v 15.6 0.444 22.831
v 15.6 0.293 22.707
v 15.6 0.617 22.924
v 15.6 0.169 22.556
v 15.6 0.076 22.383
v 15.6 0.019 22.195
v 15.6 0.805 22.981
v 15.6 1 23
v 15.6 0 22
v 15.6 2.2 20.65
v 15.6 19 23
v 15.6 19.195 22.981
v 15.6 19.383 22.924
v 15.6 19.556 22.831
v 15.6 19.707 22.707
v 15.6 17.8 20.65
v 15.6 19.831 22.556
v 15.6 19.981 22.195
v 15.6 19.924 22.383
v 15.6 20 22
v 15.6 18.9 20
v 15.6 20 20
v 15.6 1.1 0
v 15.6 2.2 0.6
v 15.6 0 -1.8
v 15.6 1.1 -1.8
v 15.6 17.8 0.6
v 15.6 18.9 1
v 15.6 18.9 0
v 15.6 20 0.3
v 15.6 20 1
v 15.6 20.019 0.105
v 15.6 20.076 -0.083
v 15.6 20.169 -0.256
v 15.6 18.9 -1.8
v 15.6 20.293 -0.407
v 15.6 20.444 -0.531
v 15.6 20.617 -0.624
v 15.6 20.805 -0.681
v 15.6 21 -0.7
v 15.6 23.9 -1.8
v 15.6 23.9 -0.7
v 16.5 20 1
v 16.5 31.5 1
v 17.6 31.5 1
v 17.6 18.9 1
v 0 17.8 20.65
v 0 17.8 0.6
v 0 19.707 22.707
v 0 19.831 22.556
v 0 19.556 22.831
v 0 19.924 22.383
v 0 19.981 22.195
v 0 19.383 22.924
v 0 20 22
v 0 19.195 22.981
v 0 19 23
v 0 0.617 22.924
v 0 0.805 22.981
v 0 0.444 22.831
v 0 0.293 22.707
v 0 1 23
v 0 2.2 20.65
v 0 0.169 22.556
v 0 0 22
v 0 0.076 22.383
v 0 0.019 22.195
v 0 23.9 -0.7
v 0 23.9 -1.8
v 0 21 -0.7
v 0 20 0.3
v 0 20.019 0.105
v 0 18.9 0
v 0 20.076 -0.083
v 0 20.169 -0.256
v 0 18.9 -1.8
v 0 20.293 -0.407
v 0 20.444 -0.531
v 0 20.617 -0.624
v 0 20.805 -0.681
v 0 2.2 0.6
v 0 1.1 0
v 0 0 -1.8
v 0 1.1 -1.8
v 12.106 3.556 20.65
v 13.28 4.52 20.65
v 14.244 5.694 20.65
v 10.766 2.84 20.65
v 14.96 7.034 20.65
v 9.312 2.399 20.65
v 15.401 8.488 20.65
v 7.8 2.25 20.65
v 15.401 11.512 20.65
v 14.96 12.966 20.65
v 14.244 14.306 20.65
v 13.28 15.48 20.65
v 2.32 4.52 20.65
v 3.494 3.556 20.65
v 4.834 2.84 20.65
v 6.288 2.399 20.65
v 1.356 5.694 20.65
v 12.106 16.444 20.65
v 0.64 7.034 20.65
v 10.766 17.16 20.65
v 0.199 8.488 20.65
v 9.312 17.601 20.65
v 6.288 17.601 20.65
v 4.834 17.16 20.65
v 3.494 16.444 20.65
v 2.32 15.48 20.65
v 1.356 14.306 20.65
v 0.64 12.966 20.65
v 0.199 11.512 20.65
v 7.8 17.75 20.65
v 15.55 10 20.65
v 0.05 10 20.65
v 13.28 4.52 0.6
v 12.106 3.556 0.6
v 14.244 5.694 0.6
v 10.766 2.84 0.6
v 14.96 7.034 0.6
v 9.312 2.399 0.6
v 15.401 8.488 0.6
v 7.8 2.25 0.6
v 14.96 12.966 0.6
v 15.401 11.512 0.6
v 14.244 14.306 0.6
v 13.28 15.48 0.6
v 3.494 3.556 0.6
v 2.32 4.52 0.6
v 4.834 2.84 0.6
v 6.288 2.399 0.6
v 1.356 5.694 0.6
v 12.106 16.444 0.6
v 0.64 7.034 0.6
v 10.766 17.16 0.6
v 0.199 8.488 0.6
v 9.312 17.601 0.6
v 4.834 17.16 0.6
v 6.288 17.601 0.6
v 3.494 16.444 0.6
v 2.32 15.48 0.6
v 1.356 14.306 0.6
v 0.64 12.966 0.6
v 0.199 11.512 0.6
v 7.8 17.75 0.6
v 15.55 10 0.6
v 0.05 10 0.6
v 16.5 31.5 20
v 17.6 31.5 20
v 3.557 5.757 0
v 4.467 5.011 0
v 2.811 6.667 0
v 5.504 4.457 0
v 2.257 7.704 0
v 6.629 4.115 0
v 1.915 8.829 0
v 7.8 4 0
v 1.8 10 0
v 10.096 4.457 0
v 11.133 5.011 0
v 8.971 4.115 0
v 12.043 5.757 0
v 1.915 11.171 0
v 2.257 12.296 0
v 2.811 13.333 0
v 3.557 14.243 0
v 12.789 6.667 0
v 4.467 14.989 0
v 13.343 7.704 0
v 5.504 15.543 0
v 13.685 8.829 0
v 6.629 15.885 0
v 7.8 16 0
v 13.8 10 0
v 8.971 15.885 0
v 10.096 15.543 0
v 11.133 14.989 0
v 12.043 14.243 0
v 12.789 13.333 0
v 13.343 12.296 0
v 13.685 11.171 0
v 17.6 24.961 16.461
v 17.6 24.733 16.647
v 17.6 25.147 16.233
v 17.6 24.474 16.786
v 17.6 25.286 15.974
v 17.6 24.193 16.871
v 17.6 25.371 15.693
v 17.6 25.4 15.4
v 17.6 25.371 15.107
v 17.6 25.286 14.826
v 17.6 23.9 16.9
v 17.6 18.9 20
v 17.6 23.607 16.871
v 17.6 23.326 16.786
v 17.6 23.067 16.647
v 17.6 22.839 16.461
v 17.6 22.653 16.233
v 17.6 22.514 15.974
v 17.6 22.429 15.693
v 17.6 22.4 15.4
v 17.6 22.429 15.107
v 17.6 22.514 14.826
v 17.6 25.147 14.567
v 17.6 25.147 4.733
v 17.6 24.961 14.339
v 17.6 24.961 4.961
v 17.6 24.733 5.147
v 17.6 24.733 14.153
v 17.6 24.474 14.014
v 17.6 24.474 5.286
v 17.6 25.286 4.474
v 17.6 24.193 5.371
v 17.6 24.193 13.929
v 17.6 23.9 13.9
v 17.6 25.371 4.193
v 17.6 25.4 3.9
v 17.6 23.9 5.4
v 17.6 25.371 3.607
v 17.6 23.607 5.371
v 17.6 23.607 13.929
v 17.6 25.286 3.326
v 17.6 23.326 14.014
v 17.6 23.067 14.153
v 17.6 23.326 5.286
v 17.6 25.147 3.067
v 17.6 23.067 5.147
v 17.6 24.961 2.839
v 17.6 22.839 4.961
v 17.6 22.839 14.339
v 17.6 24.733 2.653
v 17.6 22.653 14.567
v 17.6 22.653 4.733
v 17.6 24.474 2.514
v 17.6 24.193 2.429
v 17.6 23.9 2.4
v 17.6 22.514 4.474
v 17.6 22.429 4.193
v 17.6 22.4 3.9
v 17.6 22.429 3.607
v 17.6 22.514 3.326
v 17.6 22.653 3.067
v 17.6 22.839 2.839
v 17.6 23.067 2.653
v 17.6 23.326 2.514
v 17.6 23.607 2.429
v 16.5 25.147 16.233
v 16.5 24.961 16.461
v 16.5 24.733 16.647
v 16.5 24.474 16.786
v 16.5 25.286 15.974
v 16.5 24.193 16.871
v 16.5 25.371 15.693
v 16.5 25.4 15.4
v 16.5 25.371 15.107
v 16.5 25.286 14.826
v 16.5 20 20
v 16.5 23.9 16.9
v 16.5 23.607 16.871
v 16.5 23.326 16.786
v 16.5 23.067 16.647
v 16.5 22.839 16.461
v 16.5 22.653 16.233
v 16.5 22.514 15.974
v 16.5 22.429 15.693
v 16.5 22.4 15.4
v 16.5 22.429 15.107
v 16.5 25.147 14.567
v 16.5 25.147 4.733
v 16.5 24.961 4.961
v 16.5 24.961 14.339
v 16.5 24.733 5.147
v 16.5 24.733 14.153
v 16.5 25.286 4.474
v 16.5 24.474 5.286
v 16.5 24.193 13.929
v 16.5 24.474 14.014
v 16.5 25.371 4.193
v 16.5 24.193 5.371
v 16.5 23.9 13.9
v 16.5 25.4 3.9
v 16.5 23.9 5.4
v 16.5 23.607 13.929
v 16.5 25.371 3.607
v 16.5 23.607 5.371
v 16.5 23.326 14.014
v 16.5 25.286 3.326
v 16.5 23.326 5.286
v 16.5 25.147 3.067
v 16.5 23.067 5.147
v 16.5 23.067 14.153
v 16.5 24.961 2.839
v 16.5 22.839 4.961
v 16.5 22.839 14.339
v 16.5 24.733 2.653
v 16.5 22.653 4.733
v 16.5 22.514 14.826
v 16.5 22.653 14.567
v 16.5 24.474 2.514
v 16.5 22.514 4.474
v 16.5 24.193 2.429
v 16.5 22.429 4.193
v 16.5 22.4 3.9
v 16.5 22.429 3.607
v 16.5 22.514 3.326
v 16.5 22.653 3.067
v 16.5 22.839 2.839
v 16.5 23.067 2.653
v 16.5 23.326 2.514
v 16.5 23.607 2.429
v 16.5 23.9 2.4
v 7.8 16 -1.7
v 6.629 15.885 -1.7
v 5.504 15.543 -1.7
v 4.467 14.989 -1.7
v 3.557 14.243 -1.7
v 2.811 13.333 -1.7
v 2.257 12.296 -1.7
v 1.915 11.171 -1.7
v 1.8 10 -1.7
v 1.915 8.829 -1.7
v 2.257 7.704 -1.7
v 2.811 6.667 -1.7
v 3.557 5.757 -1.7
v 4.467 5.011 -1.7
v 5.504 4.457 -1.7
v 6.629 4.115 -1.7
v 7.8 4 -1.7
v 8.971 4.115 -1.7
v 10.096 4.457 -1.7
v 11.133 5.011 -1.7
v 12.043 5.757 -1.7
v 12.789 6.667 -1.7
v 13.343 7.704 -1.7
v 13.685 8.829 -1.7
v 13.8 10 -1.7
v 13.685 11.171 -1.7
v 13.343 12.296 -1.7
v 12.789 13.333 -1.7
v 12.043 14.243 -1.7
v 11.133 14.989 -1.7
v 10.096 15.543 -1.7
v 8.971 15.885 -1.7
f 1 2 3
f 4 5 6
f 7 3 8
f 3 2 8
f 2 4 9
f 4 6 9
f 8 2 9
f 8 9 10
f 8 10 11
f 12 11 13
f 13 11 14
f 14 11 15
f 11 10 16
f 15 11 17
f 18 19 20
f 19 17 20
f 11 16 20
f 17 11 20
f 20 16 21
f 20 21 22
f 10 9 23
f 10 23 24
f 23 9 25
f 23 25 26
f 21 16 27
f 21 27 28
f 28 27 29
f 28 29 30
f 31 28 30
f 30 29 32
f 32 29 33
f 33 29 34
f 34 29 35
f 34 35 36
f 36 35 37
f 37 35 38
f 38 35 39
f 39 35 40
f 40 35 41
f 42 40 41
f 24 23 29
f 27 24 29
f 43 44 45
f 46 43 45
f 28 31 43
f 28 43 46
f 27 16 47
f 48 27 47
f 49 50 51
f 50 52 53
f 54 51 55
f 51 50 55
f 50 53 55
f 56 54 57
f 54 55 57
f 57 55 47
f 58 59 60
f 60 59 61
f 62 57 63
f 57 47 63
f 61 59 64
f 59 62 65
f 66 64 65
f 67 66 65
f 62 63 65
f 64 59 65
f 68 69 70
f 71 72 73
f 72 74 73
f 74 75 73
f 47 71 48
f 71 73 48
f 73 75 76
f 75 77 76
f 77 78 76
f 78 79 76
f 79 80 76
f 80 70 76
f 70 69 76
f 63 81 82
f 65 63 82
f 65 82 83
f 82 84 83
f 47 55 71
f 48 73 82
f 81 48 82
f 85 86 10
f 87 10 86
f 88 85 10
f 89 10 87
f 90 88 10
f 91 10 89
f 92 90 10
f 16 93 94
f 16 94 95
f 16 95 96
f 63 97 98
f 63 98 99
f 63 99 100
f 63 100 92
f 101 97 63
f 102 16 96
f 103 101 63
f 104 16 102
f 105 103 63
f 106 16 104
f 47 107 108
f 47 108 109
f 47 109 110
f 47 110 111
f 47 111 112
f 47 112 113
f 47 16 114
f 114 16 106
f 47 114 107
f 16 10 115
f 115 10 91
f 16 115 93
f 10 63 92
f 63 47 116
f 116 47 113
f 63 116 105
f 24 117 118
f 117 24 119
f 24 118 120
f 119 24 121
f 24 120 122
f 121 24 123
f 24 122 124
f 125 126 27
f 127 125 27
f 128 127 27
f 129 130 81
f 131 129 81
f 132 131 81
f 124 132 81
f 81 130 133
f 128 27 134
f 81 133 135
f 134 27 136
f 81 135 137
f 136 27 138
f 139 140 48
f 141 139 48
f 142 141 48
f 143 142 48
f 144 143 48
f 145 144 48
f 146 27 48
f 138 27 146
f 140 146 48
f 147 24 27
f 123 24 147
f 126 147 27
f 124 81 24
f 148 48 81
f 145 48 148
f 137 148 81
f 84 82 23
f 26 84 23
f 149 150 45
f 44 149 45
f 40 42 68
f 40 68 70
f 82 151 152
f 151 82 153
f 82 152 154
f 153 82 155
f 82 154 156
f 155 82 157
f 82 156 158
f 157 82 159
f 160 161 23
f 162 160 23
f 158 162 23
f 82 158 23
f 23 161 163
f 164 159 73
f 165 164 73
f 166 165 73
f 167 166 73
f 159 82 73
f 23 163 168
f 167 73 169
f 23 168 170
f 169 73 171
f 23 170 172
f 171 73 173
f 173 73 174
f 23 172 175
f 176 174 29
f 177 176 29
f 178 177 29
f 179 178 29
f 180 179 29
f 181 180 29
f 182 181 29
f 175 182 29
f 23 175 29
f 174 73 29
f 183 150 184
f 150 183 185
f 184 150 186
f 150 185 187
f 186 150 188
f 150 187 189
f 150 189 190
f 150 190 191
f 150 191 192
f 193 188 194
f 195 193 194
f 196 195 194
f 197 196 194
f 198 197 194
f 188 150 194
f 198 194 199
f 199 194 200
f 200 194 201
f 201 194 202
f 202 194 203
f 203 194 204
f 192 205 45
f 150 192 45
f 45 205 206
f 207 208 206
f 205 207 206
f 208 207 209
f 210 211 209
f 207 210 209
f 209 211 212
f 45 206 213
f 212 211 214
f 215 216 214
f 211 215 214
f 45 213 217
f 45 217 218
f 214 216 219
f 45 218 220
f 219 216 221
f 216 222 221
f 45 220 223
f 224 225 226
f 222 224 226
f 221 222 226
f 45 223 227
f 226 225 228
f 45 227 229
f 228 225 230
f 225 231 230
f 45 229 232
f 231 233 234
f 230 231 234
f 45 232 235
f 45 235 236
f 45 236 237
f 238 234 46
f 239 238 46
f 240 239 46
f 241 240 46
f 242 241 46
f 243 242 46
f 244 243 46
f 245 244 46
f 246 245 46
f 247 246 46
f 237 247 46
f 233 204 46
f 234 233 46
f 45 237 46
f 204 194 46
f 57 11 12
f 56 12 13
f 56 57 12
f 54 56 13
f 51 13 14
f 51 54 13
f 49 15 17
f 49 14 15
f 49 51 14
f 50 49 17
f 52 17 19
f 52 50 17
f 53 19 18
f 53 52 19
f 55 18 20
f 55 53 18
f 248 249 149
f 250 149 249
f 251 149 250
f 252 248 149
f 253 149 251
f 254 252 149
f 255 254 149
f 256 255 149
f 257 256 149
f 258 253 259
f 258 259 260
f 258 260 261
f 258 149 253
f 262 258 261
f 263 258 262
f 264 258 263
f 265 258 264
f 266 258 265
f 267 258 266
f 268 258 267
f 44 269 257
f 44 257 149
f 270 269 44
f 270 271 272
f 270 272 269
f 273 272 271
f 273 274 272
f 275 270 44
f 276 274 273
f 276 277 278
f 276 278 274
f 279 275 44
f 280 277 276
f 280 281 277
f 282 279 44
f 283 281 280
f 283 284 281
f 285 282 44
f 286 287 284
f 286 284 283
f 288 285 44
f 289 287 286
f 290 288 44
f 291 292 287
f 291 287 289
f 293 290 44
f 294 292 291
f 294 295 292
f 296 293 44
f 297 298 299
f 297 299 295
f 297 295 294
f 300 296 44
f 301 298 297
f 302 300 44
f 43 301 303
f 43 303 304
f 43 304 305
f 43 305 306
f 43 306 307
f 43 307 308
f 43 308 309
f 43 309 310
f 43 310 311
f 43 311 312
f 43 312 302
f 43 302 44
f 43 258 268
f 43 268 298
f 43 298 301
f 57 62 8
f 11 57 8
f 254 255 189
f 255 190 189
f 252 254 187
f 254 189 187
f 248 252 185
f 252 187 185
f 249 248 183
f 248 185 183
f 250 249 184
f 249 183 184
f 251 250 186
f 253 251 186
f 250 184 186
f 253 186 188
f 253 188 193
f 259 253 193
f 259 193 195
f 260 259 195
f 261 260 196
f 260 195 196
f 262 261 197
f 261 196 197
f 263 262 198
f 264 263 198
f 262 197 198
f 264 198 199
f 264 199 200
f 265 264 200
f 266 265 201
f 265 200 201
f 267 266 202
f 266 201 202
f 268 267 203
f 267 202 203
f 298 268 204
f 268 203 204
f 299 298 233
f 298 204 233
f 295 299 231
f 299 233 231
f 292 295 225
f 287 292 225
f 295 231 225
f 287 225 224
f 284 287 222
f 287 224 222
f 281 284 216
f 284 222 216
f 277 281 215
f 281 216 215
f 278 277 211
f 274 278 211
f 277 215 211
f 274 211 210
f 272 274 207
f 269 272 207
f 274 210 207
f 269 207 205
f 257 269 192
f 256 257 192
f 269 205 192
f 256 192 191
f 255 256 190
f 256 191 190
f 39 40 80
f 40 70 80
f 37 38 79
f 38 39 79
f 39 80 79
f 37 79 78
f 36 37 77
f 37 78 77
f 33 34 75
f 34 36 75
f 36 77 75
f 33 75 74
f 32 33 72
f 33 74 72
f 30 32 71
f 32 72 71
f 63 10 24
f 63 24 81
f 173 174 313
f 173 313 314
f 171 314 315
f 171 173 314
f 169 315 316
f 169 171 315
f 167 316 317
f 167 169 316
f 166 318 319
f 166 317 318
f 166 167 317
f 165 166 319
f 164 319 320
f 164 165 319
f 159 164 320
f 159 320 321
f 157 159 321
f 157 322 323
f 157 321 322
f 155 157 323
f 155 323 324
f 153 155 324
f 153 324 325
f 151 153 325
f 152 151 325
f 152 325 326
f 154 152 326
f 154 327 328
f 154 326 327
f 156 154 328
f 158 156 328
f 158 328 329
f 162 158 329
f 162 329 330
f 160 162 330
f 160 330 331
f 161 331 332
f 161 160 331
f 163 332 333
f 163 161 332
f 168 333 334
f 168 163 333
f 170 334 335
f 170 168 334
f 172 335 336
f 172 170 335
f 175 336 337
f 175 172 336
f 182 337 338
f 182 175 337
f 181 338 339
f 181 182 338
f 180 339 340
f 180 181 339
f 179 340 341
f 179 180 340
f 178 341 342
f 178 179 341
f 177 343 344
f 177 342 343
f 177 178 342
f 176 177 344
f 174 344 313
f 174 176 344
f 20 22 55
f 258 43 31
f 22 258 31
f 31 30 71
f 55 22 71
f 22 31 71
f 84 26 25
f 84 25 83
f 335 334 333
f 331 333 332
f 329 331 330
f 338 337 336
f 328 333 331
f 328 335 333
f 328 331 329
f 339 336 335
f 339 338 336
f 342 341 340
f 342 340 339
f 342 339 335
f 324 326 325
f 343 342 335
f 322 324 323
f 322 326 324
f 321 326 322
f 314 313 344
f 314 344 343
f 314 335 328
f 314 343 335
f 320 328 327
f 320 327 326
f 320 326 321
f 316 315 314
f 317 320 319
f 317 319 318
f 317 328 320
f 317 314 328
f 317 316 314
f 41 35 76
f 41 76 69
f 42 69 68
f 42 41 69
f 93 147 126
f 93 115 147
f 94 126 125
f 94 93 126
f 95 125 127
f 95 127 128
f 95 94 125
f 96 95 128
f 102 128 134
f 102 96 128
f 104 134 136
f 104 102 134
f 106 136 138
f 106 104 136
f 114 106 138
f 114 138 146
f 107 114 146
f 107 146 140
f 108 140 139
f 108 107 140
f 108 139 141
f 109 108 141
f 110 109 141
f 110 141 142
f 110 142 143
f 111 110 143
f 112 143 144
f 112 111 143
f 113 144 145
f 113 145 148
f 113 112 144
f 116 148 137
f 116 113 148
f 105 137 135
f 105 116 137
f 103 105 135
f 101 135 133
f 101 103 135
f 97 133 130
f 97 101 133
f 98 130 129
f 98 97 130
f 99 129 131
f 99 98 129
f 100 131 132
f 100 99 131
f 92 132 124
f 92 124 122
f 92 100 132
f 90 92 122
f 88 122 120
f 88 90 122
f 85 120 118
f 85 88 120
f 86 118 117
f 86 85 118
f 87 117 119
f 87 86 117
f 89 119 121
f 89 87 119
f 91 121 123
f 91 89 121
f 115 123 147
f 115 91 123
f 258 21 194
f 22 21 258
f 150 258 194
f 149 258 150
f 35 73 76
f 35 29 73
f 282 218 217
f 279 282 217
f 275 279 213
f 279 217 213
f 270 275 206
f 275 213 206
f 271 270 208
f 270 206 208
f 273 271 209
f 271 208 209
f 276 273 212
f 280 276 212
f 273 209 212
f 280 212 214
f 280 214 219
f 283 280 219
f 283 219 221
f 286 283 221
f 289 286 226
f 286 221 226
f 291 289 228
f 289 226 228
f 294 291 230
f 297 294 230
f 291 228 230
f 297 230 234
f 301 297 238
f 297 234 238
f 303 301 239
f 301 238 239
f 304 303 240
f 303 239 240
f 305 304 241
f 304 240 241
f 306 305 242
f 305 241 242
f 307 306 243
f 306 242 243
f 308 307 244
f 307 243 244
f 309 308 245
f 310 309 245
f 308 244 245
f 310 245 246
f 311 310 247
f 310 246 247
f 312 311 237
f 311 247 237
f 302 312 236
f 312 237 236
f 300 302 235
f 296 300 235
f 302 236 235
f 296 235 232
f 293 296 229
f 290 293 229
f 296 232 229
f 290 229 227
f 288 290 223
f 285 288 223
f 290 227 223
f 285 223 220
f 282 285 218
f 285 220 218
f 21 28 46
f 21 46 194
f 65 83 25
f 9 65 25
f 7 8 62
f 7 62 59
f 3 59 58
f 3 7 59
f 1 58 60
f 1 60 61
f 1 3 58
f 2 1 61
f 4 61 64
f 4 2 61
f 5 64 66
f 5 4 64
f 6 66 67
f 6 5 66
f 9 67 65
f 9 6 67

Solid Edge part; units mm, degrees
sketch "Sketch1" plane through (0, 0, 0) normal (0, 0, 1) x (1, 0, 0)
  line L0 (15.6, 20) -> (0, 20)
  line L1 (0, 20) -> (0, 0)
  line L2 (0, 0) -> (15.6, 0)
  line L3 (15.6, 0) -> (15.6, 20)
extrude "Protrusion1" add sketch "Sketch1" along normal blind 23
sketch "Sketch2" plane through (7.8, 10, 0) normal (0, 0, -1) x (0, 1, 0)
  circle A0 centre (0, 0) radius 6
extrude "ProtrusiónExtruida_2" add sketch "Sketch2" along normal blind 1.7
sketch "Sketch3" plane through (15.6, 10, 11.5) normal (1, 0, 0) x (0, 1, 0)
  line L0 (8.9, -13.3) -> (13.9, -13.3)
  line L1 (13.9, -13.3) -> (13.9, -12.2)
  line L2 (13.9, -12.2) -> (10, -12.2)
  line L3 (10, -12.2) -> (10, -11.5)
  line L4 (8.9, -11.5) -> (10, -11.5)
  line L5 (8.9, -11.5) -> (8.9, -13.3)
extrude "Protrusion2" add sketch "Sketch3" against normal up to surface (15.6 mm away)
sketch "Sketch4" plane through (15.6, 11.95, 10.6) normal (1, 0, 0) x (0, 1, 0)
  line L0 (6.95, -9.6) -> (6.95, 9.4)
  line L1 (6.95, 9.4) -> (8.05, 9.4)
  line L2 (8.05, 9.4) -> (8.05, -9.6)
  line L3 (8.05, -9.6) -> (6.95, -9.6)
extrude "ProtrusiónExtruida_4" add sketch "Sketch4" along normal blind 2
sketch "Sketch5" plane through (8.8, 20, 11.15) normal (0, 1, 0) x (-1, 0, 0)
  line L0 (-7.7, 8.85) -> (-7.7, -10.15)
  line L1 (-7.7, -10.15) -> (-8.8, -10.15)
  line L2 (-8.8, -10.15) -> (-8.8, 8.85)
  line L3 (-8.8, 8.85) -> (-7.7, 8.85)
extrude "ProtrusiónExtruida_5" add sketch "Sketch5" along normal blind 11.5
sketch "Sketch6" plane through (7.8, 9.45, 0) normal (0, 0, -1) x (0, 1, 0)
  line L0 (-8.35, -7.8) -> (-8.35, 7.8)
  line L1 (-8.35, 7.8) -> (-9.45, 7.8)
  line L2 (-9.45, 7.8) -> (-9.45, -7.8)
  line L3 (-9.45, -7.8) -> (-8.35, -7.8)
extrude "ProtrusiónExtruida_6" add sketch "Sketch6" along normal blind 1.8
sketch "Sketch7" plane through (17.6, 25.2, 10.5) normal (1, 0, 0) x (0, 1, 0)
  circle A0 centre (-1.3, 4.9) radius 1.5
  circle A1 centre (-1.3, -6.6) radius 1.5
  dimension "D1" = 3
  dimension "D2" = 2.9
  dimension "D3" = 5
  dimension "D4" = 11.5
extrude "Cutout1" cut sketch "Sketch7" against normal up to next
sketch "Sketch8" plane through (7.8, 10, 23) normal (0, 0, 1) x (1, 0, 0)
  line L0 (7.8, -7.8) -> (-7.8, -7.8)
  line L1 (-7.8, 7.8) -> (-7.8, -7.8)
  line L2 (7.8, 7.8) -> (-7.8, 7.8)
  line L3 (7.8, -7.8) -> (7.8, 7.8)
  circle A0 centre (0, 0) radius 7.75
  dimension "D1" = 15.5
  dimension "D2" = 7.8
  dimension "D3" = 7.8
extrude "Cutout2" cut sketch "Sketch8" against normal up to surface (20.05 mm away) from surface at -2.35
fillet "Redondeo_1" radius 1 3 edges at (7.8, 20, 23) (7.8, 0, 23) (7.8, 20, -0.7)
